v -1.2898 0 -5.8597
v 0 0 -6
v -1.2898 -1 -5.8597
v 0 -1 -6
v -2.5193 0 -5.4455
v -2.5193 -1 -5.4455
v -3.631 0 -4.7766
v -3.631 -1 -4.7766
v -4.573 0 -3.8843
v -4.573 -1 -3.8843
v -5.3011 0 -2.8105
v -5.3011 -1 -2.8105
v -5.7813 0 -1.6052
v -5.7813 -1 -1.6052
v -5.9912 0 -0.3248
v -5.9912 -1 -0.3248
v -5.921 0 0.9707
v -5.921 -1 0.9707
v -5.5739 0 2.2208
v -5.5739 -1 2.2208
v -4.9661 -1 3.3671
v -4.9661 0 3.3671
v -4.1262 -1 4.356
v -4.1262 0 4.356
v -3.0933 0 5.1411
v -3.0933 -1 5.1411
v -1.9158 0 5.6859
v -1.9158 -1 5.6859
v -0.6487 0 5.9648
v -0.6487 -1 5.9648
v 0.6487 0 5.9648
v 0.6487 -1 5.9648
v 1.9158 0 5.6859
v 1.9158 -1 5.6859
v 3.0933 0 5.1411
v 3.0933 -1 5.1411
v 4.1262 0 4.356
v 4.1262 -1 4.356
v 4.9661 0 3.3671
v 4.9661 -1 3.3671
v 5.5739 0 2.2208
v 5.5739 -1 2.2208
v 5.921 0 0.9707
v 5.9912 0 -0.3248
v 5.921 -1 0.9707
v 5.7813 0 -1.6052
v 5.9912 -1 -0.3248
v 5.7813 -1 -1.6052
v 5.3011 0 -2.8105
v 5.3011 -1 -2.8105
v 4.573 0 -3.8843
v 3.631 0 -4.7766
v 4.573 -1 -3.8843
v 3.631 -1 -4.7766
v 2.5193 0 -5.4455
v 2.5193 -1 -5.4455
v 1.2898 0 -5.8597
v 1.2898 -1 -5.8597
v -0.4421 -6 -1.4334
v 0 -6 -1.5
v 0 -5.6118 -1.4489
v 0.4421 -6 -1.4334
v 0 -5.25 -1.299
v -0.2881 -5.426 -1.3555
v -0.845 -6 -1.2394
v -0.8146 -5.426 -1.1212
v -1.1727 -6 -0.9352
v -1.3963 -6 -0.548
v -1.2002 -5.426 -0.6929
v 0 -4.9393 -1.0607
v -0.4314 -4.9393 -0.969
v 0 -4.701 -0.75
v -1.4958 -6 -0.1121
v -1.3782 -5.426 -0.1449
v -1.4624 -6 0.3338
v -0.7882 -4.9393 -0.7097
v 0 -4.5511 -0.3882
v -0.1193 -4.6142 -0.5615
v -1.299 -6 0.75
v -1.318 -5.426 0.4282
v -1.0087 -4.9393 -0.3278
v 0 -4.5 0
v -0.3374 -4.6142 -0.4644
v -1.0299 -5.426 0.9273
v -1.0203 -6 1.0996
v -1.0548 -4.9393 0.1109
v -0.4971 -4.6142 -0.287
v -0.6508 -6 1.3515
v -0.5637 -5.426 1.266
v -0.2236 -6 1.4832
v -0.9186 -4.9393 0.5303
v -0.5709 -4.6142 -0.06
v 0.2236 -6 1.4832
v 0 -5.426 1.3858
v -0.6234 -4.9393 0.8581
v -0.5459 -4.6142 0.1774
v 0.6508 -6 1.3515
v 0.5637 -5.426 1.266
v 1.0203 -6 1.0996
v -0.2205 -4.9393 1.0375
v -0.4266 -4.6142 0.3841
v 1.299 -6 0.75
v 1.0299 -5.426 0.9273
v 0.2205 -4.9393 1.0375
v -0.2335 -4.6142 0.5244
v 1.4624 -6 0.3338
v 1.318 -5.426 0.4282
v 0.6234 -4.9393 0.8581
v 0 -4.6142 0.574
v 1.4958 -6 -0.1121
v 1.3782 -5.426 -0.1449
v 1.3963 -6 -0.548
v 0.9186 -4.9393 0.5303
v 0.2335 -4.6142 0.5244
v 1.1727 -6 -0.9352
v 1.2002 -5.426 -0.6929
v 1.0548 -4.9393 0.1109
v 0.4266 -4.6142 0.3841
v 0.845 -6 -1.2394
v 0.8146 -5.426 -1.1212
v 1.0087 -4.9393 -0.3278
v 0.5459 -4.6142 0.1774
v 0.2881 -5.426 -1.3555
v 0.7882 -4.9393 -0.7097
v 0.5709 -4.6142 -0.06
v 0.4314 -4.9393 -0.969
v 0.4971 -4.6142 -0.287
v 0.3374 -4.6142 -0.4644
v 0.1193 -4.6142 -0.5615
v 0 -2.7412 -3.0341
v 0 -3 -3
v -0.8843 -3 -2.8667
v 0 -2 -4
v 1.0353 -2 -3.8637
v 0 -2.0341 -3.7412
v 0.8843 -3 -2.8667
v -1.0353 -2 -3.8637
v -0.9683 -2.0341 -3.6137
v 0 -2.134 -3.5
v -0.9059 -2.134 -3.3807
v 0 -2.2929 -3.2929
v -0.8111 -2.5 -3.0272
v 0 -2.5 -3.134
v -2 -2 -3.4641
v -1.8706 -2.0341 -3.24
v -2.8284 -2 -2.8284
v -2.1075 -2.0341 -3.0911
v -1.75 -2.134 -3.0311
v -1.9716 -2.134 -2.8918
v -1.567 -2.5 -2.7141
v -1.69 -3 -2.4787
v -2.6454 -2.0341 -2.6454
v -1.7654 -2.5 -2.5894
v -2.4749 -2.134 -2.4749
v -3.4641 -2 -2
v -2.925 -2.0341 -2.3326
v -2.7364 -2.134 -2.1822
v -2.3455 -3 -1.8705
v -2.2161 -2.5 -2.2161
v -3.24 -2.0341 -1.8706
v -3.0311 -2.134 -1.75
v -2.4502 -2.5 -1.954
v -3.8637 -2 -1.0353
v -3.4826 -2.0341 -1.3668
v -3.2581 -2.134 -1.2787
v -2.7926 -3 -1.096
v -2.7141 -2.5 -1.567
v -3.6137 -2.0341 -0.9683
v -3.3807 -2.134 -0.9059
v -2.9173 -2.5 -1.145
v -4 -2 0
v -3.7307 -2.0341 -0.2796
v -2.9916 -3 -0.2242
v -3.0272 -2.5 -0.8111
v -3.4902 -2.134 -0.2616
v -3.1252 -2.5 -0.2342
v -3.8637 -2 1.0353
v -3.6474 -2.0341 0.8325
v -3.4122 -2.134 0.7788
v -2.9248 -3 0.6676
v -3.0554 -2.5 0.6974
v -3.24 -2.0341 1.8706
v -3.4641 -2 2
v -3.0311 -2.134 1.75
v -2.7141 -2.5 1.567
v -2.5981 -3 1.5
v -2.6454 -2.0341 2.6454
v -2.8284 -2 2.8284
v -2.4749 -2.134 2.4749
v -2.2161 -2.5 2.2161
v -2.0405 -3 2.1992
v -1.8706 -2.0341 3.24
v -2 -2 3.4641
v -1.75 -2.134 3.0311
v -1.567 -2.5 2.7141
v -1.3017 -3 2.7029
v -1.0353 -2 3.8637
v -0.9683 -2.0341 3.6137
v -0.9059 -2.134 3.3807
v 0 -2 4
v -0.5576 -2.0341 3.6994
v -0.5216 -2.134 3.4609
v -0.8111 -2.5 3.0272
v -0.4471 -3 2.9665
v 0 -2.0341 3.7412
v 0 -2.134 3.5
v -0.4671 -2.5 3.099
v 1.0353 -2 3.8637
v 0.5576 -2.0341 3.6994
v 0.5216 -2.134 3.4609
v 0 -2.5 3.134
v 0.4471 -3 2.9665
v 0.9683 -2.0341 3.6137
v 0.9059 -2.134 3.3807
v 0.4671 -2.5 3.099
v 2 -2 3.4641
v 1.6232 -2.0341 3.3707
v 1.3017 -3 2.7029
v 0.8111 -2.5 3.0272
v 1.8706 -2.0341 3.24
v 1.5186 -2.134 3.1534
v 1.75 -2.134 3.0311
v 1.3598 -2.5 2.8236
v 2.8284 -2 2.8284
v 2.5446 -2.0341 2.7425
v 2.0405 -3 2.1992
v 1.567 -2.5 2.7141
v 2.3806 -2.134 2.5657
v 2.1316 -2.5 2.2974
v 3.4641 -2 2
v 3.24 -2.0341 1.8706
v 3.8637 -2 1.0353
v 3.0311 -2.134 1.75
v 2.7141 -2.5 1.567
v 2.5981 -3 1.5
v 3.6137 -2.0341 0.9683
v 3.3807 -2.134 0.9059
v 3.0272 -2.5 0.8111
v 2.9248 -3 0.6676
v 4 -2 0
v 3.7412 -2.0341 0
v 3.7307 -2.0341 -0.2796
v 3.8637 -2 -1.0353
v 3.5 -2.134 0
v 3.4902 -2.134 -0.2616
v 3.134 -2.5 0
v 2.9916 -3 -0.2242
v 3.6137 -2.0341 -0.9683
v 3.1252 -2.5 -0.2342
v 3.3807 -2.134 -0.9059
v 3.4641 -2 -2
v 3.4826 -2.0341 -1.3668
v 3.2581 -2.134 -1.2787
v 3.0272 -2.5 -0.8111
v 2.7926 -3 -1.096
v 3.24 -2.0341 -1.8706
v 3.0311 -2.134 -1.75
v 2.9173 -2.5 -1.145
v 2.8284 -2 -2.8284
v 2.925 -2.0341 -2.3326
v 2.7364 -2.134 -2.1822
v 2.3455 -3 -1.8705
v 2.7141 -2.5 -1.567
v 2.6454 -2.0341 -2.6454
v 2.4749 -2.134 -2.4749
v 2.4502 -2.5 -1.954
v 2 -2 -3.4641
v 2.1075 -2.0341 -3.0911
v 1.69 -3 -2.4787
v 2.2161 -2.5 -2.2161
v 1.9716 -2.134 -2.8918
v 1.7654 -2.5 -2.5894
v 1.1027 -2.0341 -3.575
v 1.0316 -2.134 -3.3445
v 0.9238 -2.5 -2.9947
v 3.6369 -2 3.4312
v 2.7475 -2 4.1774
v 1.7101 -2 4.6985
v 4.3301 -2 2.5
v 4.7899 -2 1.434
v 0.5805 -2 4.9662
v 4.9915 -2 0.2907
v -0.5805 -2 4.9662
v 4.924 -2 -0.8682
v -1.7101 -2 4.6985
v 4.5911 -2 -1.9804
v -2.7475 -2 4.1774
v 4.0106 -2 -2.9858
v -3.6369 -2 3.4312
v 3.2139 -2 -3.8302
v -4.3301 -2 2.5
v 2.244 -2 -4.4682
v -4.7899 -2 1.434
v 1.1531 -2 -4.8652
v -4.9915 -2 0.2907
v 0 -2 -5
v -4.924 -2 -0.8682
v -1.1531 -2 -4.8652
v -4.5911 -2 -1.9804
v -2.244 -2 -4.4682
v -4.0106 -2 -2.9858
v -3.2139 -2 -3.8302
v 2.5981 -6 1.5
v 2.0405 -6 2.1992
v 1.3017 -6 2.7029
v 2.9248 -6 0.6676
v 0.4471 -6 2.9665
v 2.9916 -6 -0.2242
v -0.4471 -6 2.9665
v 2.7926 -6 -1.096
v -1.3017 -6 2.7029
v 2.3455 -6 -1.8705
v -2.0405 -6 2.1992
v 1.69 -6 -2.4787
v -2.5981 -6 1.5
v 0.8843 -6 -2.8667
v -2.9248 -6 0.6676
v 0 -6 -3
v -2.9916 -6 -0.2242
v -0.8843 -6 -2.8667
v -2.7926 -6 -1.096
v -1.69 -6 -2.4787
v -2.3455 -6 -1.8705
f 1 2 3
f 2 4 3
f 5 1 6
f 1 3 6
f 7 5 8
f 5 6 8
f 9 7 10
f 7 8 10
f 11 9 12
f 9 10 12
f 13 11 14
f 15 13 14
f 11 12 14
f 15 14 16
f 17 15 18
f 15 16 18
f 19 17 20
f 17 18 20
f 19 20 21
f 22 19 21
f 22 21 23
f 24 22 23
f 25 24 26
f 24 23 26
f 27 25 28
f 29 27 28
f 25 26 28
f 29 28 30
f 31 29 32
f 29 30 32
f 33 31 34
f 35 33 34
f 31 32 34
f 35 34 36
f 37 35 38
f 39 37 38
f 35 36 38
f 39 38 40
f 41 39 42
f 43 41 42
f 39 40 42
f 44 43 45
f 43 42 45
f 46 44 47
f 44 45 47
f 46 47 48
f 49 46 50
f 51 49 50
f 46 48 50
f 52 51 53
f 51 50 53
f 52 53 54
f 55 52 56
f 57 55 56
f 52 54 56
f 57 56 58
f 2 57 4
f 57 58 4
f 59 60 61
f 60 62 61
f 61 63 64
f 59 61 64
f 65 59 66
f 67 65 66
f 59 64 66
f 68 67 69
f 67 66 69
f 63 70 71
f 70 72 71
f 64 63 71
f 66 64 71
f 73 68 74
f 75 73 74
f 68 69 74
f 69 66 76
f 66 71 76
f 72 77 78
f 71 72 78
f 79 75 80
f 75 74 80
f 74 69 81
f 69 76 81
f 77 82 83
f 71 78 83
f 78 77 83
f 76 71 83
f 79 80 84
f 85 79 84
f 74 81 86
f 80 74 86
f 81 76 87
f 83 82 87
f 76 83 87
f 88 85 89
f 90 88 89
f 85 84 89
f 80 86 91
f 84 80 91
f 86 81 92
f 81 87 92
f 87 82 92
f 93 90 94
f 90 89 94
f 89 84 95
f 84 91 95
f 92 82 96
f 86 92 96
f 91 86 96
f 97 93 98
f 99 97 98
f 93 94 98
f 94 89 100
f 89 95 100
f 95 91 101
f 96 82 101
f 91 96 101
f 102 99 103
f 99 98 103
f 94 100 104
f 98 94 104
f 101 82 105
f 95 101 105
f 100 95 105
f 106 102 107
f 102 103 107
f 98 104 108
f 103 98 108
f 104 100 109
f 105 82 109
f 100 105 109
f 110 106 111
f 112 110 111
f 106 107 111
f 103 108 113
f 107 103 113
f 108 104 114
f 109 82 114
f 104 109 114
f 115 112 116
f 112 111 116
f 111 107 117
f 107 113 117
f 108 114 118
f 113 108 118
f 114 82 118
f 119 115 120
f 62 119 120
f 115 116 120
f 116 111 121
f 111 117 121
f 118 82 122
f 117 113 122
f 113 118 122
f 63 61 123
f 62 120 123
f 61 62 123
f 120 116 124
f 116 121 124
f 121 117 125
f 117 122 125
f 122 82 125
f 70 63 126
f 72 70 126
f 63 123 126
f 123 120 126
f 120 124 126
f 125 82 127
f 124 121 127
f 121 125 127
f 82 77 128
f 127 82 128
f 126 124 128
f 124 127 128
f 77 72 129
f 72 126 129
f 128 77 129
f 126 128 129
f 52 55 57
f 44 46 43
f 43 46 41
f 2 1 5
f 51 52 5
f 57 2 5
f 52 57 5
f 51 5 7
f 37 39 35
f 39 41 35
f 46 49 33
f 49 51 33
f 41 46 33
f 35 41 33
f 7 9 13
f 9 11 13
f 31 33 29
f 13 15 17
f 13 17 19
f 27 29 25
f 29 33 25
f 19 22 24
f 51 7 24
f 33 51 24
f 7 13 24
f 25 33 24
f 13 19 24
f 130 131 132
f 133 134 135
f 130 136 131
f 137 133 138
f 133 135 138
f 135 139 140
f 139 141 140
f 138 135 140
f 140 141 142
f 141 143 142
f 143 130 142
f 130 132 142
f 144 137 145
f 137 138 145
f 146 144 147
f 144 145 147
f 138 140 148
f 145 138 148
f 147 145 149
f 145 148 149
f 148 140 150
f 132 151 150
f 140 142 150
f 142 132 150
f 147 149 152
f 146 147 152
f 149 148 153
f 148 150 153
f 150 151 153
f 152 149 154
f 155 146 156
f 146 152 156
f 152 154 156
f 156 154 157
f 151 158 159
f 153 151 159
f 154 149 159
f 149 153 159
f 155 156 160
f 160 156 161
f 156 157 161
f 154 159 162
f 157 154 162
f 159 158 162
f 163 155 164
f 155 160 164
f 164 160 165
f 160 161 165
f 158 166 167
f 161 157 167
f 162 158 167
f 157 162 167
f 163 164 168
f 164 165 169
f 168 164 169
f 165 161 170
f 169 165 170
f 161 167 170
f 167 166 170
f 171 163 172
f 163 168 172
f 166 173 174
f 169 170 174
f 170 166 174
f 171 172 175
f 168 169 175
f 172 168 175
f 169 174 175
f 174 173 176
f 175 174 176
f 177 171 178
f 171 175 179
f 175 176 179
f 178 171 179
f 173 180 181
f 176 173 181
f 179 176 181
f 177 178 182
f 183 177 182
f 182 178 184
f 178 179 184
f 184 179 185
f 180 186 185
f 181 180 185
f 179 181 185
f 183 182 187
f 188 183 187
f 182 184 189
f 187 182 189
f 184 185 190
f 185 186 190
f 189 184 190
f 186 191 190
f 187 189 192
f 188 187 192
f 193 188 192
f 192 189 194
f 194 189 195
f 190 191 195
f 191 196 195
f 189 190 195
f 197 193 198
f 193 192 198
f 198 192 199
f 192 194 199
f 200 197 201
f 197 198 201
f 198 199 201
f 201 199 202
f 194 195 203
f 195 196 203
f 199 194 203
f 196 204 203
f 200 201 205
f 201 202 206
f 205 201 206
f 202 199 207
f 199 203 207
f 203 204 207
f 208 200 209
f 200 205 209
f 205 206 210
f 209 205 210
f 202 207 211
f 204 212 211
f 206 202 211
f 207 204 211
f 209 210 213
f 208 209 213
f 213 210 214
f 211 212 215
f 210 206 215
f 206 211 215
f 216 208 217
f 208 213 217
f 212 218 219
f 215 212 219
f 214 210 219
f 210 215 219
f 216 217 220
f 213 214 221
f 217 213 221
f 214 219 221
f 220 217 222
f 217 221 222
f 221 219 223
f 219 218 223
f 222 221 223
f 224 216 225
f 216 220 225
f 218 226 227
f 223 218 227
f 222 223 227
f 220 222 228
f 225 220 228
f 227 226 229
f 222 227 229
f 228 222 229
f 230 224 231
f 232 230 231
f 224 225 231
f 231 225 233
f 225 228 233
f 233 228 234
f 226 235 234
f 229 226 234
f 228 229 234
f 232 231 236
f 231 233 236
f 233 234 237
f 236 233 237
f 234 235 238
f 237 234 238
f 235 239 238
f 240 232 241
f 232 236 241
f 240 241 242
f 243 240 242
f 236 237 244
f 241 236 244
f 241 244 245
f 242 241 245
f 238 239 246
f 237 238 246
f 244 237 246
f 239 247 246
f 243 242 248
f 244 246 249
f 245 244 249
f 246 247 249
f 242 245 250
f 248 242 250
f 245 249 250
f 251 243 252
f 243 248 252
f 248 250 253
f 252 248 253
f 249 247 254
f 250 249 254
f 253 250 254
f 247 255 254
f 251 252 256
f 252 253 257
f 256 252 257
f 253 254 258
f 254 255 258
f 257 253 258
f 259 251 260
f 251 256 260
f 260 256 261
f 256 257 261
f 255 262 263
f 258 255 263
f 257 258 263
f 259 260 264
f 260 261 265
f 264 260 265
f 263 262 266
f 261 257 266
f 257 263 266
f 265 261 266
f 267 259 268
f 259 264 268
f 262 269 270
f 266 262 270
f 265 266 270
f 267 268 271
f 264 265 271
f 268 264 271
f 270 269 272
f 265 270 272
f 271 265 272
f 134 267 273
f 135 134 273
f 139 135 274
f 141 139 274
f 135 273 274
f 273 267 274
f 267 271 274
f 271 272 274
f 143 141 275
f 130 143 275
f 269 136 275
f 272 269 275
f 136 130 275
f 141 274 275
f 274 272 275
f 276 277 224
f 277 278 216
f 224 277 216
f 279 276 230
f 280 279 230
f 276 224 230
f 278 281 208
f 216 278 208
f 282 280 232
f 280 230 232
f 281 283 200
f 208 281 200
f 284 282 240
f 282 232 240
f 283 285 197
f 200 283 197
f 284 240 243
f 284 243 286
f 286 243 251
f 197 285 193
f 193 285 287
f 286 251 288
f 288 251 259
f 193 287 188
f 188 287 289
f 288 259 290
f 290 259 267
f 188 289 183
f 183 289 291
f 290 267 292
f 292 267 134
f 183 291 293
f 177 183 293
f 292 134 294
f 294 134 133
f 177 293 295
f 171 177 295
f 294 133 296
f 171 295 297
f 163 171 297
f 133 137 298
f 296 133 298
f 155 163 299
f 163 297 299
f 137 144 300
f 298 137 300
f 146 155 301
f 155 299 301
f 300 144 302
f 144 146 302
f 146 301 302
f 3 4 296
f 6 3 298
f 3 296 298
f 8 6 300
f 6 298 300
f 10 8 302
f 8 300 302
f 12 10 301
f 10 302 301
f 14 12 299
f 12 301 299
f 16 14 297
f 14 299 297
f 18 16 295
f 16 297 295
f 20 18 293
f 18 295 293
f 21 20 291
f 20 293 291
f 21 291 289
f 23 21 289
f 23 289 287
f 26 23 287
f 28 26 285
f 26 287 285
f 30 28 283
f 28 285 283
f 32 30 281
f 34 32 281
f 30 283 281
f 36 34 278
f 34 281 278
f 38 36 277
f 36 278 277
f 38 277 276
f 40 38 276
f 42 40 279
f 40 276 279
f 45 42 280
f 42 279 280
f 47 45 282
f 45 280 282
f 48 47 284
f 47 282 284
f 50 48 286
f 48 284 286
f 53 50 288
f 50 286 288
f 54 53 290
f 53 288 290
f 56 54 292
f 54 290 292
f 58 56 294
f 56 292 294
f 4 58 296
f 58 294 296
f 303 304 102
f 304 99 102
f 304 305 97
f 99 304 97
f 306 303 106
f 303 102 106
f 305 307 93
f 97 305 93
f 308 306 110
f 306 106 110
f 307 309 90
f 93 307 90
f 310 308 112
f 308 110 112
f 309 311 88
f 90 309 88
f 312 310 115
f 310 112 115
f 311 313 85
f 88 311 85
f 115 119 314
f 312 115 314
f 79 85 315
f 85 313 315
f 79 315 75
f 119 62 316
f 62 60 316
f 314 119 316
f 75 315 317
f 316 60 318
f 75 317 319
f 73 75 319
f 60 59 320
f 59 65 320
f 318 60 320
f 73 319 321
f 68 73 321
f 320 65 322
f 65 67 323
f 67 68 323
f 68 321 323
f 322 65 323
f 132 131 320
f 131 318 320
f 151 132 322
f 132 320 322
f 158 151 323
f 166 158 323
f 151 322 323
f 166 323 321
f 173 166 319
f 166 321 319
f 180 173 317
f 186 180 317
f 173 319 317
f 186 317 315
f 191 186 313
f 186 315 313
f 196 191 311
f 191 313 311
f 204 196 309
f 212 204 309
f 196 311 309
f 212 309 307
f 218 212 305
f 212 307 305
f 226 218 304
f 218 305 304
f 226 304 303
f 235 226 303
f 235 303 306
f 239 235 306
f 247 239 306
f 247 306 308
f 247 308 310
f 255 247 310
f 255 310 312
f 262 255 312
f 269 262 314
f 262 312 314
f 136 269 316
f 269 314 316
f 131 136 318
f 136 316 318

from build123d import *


with BuildPart() as part:
    # Szkic1 → Obrót1 (revolve)
    with BuildSketch(Plane.XY, mode=Mode.PRIVATE) as obr_t1_sk:
        with BuildLine():
            Line((0, 0), (6, 0))
            Line((6, 0), (6, -1))
            Line((6, -1), (5, -2))
            Line((5, -2), (4, -2))
            ThreePointArc((4, -2), (3.292893219, -2.292893219), (3, -3))
            Line((3, -3), (3, -6))
            Line((3, -6), (1.5, -6))
            ThreePointArc((1.5, -6), (1.060660172, -4.939339828), (0, -4.5))
            Line((0, -4.5), (0, 0))
        make_face()
    revolve(obr_t1_sk.sketch.rotate(Axis((0, -4.5, 0), (0, 1, 0)), 90), axis=Axis((0, -4.5, 0), (0, 1, 0)))


solid = part.part
